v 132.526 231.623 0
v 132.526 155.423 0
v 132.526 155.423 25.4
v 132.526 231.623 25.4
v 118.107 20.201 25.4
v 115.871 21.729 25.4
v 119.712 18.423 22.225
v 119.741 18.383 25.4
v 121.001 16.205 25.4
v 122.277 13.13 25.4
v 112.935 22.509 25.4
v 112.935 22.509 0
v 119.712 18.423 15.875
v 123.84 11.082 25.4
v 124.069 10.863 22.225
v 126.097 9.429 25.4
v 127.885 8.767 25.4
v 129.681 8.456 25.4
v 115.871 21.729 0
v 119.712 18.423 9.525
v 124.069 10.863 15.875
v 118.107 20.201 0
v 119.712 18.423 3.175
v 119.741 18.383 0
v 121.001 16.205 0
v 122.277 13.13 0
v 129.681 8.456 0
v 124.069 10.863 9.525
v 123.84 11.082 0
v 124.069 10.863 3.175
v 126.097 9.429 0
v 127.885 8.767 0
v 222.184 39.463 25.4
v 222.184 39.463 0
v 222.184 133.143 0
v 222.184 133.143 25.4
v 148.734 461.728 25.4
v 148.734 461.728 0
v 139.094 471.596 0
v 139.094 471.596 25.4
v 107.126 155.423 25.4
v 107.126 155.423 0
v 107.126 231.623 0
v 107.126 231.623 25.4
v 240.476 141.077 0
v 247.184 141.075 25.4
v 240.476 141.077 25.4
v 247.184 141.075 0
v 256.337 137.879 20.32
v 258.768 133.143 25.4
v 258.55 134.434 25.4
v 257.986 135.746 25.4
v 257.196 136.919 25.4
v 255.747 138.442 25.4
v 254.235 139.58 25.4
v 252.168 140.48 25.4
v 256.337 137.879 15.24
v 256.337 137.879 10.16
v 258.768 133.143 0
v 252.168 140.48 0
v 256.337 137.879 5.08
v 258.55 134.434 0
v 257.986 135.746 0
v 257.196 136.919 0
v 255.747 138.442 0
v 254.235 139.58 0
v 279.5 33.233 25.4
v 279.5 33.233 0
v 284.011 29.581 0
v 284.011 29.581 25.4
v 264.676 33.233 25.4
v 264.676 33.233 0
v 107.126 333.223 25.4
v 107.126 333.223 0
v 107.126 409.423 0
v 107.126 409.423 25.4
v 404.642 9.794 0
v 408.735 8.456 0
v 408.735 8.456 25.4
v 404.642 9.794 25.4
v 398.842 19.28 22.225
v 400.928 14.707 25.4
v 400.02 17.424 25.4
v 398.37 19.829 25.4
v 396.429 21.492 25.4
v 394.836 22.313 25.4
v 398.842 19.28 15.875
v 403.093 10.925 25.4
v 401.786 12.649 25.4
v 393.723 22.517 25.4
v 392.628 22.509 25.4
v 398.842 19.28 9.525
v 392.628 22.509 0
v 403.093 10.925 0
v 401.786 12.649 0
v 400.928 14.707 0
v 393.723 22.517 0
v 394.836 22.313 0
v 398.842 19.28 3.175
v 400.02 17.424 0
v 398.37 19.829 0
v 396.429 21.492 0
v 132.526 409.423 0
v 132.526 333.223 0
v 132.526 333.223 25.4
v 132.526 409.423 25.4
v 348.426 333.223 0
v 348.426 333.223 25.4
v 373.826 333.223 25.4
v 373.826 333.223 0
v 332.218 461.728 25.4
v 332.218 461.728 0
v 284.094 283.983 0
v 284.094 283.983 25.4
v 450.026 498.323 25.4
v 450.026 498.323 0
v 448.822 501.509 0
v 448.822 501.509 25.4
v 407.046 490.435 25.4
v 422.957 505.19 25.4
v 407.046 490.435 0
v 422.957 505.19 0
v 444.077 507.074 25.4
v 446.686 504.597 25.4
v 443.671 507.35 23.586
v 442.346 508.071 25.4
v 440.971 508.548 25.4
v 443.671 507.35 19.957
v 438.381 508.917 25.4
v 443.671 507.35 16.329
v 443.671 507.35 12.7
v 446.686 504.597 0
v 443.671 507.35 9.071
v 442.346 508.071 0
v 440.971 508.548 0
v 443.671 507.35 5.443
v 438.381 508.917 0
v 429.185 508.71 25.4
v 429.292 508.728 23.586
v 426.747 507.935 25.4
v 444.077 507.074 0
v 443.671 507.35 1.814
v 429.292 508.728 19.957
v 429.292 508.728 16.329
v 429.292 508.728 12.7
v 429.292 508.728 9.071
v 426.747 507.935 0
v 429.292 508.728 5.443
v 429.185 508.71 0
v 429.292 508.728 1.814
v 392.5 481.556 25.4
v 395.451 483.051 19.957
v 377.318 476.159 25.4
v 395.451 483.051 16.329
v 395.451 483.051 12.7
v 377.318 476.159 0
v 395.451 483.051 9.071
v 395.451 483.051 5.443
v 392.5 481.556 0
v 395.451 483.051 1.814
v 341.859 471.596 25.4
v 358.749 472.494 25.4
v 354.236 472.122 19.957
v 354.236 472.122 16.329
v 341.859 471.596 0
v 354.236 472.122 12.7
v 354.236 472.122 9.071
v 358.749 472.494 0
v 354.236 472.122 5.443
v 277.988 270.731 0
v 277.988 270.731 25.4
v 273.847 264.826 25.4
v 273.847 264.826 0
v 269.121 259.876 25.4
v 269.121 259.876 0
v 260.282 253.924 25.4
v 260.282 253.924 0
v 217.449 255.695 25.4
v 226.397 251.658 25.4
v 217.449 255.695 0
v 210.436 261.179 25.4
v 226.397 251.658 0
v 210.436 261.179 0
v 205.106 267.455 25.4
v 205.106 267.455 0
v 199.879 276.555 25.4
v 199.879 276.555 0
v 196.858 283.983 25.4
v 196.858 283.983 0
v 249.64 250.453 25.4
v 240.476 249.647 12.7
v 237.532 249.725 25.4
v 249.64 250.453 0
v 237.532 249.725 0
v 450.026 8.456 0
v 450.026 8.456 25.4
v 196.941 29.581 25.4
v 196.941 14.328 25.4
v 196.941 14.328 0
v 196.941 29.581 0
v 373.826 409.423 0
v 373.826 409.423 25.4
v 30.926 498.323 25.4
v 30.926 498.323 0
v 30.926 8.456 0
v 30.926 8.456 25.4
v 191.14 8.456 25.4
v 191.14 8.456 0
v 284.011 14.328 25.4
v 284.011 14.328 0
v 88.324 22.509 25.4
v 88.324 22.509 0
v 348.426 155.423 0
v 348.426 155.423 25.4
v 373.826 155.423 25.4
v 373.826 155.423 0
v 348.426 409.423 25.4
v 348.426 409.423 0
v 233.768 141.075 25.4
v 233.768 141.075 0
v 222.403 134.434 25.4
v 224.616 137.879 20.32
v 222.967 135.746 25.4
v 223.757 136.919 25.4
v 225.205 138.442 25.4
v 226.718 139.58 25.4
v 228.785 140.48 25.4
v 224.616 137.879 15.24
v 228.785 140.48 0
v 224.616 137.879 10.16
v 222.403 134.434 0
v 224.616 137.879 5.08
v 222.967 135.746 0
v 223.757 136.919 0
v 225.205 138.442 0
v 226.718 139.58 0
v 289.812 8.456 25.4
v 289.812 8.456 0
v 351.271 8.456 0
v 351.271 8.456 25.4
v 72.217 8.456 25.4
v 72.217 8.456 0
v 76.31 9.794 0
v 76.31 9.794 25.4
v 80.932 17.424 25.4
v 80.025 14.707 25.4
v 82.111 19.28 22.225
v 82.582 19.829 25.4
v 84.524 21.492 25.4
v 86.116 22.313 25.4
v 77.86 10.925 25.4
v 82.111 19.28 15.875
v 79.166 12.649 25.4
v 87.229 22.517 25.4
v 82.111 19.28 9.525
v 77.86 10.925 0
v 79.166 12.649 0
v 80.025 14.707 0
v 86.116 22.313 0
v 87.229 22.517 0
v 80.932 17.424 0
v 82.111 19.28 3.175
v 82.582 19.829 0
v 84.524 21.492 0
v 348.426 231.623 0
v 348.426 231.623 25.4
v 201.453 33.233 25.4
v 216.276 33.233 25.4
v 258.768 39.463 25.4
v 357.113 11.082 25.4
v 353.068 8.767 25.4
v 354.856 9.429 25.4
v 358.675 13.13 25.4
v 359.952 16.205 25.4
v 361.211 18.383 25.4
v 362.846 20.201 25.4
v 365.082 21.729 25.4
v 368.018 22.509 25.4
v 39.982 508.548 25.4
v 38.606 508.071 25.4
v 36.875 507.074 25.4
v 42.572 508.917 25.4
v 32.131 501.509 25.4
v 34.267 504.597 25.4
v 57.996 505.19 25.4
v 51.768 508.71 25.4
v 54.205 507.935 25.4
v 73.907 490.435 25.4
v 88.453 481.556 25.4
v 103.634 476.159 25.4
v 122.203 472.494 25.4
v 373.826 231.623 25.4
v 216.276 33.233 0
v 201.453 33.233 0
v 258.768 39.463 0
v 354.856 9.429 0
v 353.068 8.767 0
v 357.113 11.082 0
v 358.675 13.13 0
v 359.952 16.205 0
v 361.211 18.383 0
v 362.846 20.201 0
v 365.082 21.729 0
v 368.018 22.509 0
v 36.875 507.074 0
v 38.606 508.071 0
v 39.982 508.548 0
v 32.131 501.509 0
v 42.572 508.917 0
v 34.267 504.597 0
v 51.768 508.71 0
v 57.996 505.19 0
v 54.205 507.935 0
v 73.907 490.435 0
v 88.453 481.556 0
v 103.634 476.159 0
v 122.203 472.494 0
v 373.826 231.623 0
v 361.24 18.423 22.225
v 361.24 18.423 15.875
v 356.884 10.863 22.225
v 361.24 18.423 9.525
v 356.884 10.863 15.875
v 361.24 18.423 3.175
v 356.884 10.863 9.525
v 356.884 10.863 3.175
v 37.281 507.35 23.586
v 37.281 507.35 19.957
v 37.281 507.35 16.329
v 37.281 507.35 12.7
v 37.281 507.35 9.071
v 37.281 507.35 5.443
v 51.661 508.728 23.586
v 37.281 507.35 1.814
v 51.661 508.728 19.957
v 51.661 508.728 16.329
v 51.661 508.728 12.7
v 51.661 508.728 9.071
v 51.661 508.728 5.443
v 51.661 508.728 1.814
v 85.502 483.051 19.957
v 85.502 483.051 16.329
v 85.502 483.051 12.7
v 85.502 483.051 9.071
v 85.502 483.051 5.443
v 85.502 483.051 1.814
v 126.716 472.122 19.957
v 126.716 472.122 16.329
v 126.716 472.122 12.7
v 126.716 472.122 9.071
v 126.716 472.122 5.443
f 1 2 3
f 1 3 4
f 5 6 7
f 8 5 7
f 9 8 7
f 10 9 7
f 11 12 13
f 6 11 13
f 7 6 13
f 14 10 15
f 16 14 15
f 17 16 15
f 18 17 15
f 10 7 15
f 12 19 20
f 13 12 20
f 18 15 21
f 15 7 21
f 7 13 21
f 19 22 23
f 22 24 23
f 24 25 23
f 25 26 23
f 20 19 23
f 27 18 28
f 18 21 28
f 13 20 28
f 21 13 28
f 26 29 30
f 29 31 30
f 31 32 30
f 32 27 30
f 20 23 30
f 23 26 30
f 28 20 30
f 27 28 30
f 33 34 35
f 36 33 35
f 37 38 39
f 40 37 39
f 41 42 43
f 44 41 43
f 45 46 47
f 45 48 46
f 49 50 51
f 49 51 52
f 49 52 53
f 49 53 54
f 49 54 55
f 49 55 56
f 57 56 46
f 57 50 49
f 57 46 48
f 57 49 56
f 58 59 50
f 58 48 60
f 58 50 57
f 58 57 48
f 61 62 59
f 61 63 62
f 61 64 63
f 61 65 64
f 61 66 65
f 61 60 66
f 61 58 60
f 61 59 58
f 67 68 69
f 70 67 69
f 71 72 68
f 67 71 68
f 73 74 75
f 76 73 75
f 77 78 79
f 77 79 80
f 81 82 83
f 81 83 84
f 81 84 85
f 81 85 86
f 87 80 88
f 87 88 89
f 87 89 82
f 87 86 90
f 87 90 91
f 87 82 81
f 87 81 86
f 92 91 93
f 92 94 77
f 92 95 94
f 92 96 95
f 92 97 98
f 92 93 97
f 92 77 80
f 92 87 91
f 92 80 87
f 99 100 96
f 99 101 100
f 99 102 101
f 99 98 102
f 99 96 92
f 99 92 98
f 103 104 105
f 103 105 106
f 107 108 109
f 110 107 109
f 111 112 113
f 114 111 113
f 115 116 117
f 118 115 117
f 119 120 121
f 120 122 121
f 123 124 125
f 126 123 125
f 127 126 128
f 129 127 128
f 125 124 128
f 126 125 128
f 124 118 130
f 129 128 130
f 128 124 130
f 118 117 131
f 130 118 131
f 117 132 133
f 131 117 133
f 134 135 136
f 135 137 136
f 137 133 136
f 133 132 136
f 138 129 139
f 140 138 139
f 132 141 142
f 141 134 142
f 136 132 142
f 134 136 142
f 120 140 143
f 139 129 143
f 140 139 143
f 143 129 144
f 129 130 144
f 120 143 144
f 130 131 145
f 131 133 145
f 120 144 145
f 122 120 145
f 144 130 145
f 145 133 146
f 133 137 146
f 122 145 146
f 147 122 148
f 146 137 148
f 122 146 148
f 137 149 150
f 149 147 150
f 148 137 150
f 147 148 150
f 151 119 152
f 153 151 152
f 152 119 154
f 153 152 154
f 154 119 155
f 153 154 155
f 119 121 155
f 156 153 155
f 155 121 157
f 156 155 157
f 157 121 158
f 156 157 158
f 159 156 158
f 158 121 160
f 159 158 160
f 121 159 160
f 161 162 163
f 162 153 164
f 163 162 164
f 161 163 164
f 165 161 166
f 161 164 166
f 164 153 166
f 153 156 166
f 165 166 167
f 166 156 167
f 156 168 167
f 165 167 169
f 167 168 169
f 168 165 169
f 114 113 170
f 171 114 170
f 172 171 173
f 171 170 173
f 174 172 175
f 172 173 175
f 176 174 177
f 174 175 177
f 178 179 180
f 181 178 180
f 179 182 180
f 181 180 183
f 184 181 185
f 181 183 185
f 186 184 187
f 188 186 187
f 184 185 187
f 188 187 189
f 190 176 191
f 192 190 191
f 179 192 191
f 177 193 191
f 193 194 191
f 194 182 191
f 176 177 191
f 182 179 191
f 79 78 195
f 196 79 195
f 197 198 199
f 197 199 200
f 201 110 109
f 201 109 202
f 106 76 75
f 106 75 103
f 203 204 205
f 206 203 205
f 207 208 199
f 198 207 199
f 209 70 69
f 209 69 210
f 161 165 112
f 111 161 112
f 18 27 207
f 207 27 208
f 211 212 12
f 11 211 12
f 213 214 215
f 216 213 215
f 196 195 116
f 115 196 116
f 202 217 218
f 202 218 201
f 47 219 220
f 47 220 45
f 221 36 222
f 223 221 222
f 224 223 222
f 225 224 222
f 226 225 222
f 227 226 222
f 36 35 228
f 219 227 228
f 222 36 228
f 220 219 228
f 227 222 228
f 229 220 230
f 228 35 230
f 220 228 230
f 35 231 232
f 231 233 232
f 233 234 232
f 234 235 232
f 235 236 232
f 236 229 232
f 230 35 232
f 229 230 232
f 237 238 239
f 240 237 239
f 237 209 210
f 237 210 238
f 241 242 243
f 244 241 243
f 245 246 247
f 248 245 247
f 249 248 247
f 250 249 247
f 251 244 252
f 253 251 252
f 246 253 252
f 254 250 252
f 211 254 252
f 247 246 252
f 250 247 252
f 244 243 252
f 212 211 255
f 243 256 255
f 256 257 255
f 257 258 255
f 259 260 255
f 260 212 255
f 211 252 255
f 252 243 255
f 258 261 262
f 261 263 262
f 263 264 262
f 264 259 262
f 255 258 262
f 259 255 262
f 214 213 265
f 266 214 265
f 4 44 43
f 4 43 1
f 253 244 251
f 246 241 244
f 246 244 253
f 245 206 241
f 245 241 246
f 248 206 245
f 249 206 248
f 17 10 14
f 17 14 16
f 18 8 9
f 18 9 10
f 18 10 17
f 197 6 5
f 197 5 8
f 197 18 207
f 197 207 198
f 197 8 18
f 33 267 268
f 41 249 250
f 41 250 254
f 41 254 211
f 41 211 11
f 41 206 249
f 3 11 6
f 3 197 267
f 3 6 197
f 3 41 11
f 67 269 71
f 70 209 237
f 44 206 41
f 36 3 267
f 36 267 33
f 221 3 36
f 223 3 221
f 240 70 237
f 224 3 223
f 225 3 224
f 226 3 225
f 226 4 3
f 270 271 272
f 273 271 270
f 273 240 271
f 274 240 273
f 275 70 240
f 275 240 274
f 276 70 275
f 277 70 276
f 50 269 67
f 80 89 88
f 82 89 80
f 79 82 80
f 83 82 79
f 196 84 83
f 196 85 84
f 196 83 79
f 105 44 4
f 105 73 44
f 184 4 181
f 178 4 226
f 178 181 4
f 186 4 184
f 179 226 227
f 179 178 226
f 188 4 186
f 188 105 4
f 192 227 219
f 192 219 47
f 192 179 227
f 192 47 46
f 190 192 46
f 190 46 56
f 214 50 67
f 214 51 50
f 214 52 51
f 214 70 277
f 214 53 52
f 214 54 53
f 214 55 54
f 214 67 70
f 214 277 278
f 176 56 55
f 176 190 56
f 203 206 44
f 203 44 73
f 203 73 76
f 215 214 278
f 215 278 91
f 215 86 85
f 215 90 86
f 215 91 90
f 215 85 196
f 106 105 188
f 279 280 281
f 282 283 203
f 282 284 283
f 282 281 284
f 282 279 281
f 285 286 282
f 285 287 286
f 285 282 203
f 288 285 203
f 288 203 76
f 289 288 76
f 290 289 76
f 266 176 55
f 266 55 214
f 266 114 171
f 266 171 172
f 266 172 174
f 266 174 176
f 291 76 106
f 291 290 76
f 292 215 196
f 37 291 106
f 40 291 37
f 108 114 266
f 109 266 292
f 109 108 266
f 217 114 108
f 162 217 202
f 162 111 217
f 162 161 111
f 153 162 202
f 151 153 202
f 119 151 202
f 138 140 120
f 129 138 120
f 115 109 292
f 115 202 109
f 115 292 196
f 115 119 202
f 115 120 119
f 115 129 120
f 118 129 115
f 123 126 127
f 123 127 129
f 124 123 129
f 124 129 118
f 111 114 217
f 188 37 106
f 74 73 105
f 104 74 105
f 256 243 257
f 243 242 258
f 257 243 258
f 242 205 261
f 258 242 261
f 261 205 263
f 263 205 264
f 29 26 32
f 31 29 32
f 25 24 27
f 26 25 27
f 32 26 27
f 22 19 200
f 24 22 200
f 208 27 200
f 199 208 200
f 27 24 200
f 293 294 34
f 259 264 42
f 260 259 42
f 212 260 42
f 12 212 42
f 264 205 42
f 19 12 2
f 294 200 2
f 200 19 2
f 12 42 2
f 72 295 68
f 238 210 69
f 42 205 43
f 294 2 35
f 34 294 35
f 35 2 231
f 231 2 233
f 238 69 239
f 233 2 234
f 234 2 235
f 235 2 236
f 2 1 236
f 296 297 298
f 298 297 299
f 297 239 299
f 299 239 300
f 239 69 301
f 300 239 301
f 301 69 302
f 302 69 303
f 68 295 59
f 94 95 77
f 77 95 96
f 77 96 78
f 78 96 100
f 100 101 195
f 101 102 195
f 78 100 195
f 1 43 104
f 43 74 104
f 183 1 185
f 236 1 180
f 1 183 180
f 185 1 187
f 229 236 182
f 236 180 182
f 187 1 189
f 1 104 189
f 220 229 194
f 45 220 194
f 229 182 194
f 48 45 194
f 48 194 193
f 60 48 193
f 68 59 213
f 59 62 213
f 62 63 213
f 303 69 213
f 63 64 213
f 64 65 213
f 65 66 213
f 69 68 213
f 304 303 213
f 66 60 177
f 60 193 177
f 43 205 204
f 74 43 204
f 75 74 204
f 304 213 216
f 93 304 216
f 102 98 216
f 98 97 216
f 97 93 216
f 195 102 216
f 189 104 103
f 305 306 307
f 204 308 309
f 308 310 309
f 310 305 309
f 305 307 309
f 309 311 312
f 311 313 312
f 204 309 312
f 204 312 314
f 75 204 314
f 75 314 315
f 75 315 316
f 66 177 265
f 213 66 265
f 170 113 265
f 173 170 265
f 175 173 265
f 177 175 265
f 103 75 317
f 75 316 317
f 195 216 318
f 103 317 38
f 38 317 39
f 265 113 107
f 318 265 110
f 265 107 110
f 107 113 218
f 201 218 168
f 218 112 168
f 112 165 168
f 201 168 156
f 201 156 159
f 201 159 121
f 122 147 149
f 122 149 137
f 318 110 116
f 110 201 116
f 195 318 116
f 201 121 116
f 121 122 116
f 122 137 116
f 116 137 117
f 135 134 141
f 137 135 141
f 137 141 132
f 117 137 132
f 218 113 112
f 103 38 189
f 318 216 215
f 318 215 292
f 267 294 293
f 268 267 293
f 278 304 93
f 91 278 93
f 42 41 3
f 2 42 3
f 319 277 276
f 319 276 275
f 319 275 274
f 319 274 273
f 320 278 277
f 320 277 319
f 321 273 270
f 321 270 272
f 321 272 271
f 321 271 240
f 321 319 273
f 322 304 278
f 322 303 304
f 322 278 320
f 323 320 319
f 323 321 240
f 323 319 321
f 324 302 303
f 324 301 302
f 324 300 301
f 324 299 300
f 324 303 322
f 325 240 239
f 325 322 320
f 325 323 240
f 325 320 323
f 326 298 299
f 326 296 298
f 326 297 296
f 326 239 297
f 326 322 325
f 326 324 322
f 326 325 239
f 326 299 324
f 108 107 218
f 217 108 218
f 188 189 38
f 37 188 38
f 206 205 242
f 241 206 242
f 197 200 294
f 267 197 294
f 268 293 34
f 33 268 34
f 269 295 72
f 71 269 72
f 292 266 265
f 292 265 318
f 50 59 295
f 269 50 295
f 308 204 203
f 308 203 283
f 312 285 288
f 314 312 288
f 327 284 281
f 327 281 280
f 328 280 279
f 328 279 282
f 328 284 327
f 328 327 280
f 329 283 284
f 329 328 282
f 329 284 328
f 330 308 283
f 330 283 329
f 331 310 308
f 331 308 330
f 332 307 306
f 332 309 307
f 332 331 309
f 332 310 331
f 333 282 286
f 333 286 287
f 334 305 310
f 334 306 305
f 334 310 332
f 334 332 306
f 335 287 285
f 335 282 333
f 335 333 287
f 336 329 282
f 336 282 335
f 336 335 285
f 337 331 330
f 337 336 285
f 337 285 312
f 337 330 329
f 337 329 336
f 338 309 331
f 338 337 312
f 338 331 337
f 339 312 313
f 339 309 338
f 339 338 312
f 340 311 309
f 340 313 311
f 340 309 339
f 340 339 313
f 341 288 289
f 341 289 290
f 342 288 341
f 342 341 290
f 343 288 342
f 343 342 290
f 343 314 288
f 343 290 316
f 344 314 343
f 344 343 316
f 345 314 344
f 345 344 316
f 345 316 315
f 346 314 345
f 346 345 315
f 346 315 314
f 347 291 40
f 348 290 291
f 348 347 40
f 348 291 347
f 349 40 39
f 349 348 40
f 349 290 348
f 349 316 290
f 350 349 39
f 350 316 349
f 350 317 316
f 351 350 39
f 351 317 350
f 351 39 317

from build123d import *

# Parameters (mm, degrees)
F0_W     = 25.4
F0_H     = 76.2
F1_DEPTH = 25.4


with BuildPart() as f1:
    # F0 (on Top) → F1 (new body)
    with BuildSketch(Plane.XY):
        with BuildLine():
            Line((30.9262787184, 498.3229439005), (30.9262787184, 8.456480433))
            Line((30.9262787184, 8.456480433), (72.217412293, 8.456480433))
            add(Edge.make_bspline(
                [(72.217412293, 8.456480433), (73.4852665028, 8.7640434819), (75.8718361425, 9.3429906739), (78.3316272813, 11.1017833794), (79.9532326715, 13.9228117219), (80.4640832014, 16.785820321), (82.01193683, 19.3684086545), (84.0107794765, 21.2518918863), (86.2908170535, 22.5906793688), (87.6761521556, 22.5351813792), (88.3244052529, 22.5092116743)],
                knots=[0, 0, 0, 0, 0.1436293041, 0.2703633698, 0.4014913452, 0.5278343271, 0.6546424922, 0.7780471952, 0.8961395023, 1, 1, 1, 1], degree=3))
            Line((88.3244052529, 22.5092116743), (112.9345819354, 22.5092116743))
            add(Edge.make_bspline(
                [(112.9345819354, 22.5092116743), (113.851131377, 22.3480925968), (115.6727567197, 22.027871361), (117.9517558244, 20.4688298476), (119.7978413404, 18.4949734034), (121.2270398065, 15.9649157252), (121.964377889, 13.3315753939), (123.9322978467, 10.7114673584), (126.8270087303, 8.8540221315), (128.7575486175, 8.5851424278), (129.6813338995, 8.456480433)],
                knots=[0, 0, 0, 0, 0.1221478091, 0.2427665486, 0.3636927244, 0.4879995502, 0.6092361004, 0.7411096874, 0.8761180424, 1, 1, 1, 1], degree=3))
            Line((129.6813338995, 8.456480433), (191.1404877901, 8.456480433))
            Line((191.1404877901, 8.456480433), (196.9410777092, 14.3275056034))
            Line((196.9410777092, 14.3275056034), (196.9410777092, 29.5809209347))
            Line((196.9410777092, 29.5809209347), (201.4526426792, 33.2331471145))
            Line((201.4526426792, 33.2331471145), (216.2763923407, 33.2331471145))
            Line((216.2763923407, 33.2331471145), (222.1844047308, 39.4634157419))
            Line((222.1844047308, 39.4634157419), (222.1844047308, 133.1428903466))
            add(Edge.make_bspline(
                [(222.1844047308, 133.1428903466), (222.1844047308, 133.917721602), (222.7889561103, 135.7917858002), (224.5542041207, 137.9380244961), (226.8313464383, 139.8580278247), (230.5840922784, 141.2265412177), (236.7059416254, 141.1206859667), (240.4762787184, 141.0770565328)],
                knots=[0, 0, 0, 0, 0.1602260225, 0.3263351359, 0.4928279093, 0.6846095993, 1, 1, 1, 1], degree=3))
            add(Edge.make_bspline(
                [(258.7681527059, 133.1428903466), (258.7681527059, 133.917721602), (258.1636013264, 135.7917858002), (256.3983533161, 137.9380244961), (254.1212109984, 139.8580278247), (250.3684651583, 141.2265412177), (244.2466158113, 141.1206859667), (240.4762787184, 141.0770565328)],
                knots=[0, 0, 0, 0, 0.1602260225, 0.3263351359, 0.4928279093, 0.6846095993, 1, 1, 1, 1], degree=3))
            Line((258.7681527059, 133.1428903466), (258.7681527059, 39.4634157419))
            Line((258.7681527059, 39.4634157419), (264.6761650961, 33.2331471145))
            Line((264.6761650961, 33.2331471145), (279.4999147575, 33.2331471145))
            Line((279.4999147575, 33.2331471145), (284.0114797275, 29.5809209347))
            Line((284.0114797275, 29.5809209347), (284.0114797275, 14.3275056034))
            Line((284.0114797275, 14.3275056034), (289.8120696466, 8.456480433))
            Line((289.8120696466, 8.456480433), (351.2712235372, 8.456480433))
            add(Edge.make_bspline(
                [(368.0179755013, 22.5092116743), (367.1014260597, 22.3480925968), (365.279800717, 22.027871361), (363.0008016123, 20.4688298476), (361.1547160963, 18.4949734034), (359.7255176302, 15.9649157252), (358.9881795477, 13.3315753939), (357.02025959, 10.7114673584), (354.1255487064, 8.8540221315), (352.1950088192, 8.5851424278), (351.2712235372, 8.456480433)],
                knots=[0, 0, 0, 0, 0.1221478091, 0.2427665486, 0.3636927244, 0.4879995502, 0.6092361004, 0.7411096874, 0.8761180424, 1, 1, 1, 1], degree=3))
            Line((368.0179755013, 22.5092116743), (392.6281521838, 22.5092116743))
            add(Edge.make_bspline(
                [(408.7351451438, 8.456480433), (407.4672909339, 8.7640434819), (405.0807212943, 9.3429906739), (402.6209301554, 11.1017833794), (400.9993247652, 13.9228117219), (400.4884742353, 16.785820321), (398.9406206067, 19.3684086545), (396.9417779602, 21.2518918863), (394.6617403832, 22.5906793688), (393.2764052811, 22.5351813792), (392.6281521838, 22.5092116743)],
                knots=[0, 0, 0, 0, 0.1436293041, 0.2703633698, 0.4014913452, 0.5278343271, 0.6546424922, 0.7780471952, 0.8961395023, 1, 1, 1, 1], degree=3))
            Line((408.7351451438, 8.456480433), (450.0262787184, 8.456480433))
            Line((450.0262787184, 8.456480433), (450.0262787184, 498.3229439005))
            add(Edge.make_bspline(
                [(450.0262787184, 498.3229439005), (449.7829850555, 499.3165610744), (449.1938815183, 501.1323831233), (447.0992675249, 504.2075151676), (444.9202583684, 506.6189963609), (441.2786130548, 508.9606932529), (435.358588646, 508.9872032227), (429.1913815619, 509.0395894009), (424.868955416, 507.2944637448), (417.9594650405, 500.3110453826), (409.7722905448, 491.8691640983), (395.4181520753, 482.4752786022), (383.1912839921, 477.5553814908), (366.2273491553, 473.2054893474), (354.4147543645, 471.9952327705), (346.0731351848, 471.7297269486), (341.8586964529, 471.5955853462)],
                knots=[0, 0, 0, 0, 0.0429300681, 0.0905584934, 0.1357841716, 0.1862979961, 0.247389759, 0.3090643341, 0.3617620414, 0.4382226544, 0.5260544206, 0.6284948022, 0.7211860438, 0.8248180391, 0.9118377504, 1, 1, 1, 1], degree=3))
            Line((341.8586964529, 471.5955853462), (332.2182561081, 461.727887392))
            Line((332.2182561081, 461.727887392), (284.0941364687, 283.982783556))
            add(Edge.make_bspline(
                [(284.0941364687, 283.982783556), (280.5210466306, 274.1951644421), (271.0321016609, 249.6468871832), (240.4762787184, 249.6468871832)],
                knots=[0, 0, 0, 0, 55.5110015623, 55.5110015623, 55.5110015623, 55.5110015623], degree=3))
            add(Edge.make_bspline(
                [(196.8584209681, 283.982783556), (200.4315108061, 274.1951644421), (209.9204557758, 249.6468871832), (240.4762787184, 249.6468871832)],
                knots=[0, 0, 0, 0, 55.5110015623, 55.5110015623, 55.5110015623, 55.5110015623], degree=3))
            Line((196.8584209681, 283.982783556), (148.7343013287, 461.727887392))
            Line((148.7343013287, 461.727887392), (139.0938609838, 471.5955853462))
            add(Edge.make_bspline(
                [(30.9262787184, 498.3229439005), (31.1695723812, 499.3165610744), (31.7586759185, 501.1323831233), (33.8532899119, 504.2075151676), (36.0322990684, 506.6189963609), (39.6739443819, 508.9606932529), (45.5939687907, 508.9872032227), (51.7611758749, 509.0395894009), (56.0836020207, 507.2944637448), (62.9930923962, 500.3110453826), (71.1802668919, 491.8691640983), (85.5344053615, 482.4752786022), (97.7612734446, 477.5553814908), (114.7252082814, 473.2054893474), (126.5378030722, 471.9952327705), (134.8794222519, 471.7297269486), (139.0938609838, 471.5955853462)],
                knots=[0, 0, 0, 0, 0.0429300681, 0.0905584934, 0.1357841716, 0.1862979961, 0.247389759, 0.3090643341, 0.3617620414, 0.4382226544, 0.5260544206, 0.6284948022, 0.7211860438, 0.8248180391, 0.9118377504, 1, 1, 1, 1], degree=3))
        make_face()
        with Locations((119.8262787184, 193.5229439005)):
            Rectangle(F0_W, F0_H, mode=Mode.SUBTRACT)
        with Locations((361.1262787184, 193.5229439005)):
            Rectangle(F0_W, F0_H, mode=Mode.SUBTRACT)
        with Locations((119.8262787184, 371.3229439005)):
            Rectangle(F0_W, F0_H, mode=Mode.SUBTRACT)
        with Locations((361.1262787184, 371.3229439005)):
            Rectangle(F0_W, F0_H, mode=Mode.SUBTRACT)
    extrude(amount=F1_DEPTH)


solid = f1.part
